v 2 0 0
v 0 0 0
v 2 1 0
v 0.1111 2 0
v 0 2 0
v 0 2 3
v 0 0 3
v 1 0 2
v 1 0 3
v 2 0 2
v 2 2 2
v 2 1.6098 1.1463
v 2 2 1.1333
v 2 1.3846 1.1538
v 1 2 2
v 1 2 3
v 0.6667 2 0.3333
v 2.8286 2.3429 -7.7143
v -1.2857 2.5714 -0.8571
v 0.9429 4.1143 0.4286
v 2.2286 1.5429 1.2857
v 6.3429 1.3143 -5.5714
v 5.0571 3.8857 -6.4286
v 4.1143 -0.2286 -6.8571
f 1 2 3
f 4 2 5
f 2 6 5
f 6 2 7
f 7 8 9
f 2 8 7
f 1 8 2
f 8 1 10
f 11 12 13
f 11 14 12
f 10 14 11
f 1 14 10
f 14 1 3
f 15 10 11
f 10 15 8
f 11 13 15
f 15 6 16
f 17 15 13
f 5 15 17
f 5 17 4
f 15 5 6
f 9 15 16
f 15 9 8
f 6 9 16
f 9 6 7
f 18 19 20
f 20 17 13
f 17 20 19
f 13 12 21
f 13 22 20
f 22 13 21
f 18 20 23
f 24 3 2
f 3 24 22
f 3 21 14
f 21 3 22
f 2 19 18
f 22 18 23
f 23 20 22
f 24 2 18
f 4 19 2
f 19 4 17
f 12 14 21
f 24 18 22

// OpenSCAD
//Various lengths
cube();  //should be fine
cube(2);  //I'm fine
cube([1]);
cube([1,2]);
cube([1,2,3]); //I'm fine
cube([1,2,3,4]);

//not numbers
cube([1,"test",3]); 
cube([1,"2",3]);
cube(["1.2","2",3]); 

square();
square(2); //I'm fine
square([1]);
square([1,2]);
square([1,2,3]);

mirror(1)
mirror([1,2])//I'm fine
mirror([1,2,3])//I'm fine
mirror([1,2,3,4])
scale(1)//I'm fine
scale([1])
scale([1,2])  //I'm fine
scale([1,2,3])//I'm fine
scale([1,2,3,4])
cube([3,2,1]); //I'm fine
